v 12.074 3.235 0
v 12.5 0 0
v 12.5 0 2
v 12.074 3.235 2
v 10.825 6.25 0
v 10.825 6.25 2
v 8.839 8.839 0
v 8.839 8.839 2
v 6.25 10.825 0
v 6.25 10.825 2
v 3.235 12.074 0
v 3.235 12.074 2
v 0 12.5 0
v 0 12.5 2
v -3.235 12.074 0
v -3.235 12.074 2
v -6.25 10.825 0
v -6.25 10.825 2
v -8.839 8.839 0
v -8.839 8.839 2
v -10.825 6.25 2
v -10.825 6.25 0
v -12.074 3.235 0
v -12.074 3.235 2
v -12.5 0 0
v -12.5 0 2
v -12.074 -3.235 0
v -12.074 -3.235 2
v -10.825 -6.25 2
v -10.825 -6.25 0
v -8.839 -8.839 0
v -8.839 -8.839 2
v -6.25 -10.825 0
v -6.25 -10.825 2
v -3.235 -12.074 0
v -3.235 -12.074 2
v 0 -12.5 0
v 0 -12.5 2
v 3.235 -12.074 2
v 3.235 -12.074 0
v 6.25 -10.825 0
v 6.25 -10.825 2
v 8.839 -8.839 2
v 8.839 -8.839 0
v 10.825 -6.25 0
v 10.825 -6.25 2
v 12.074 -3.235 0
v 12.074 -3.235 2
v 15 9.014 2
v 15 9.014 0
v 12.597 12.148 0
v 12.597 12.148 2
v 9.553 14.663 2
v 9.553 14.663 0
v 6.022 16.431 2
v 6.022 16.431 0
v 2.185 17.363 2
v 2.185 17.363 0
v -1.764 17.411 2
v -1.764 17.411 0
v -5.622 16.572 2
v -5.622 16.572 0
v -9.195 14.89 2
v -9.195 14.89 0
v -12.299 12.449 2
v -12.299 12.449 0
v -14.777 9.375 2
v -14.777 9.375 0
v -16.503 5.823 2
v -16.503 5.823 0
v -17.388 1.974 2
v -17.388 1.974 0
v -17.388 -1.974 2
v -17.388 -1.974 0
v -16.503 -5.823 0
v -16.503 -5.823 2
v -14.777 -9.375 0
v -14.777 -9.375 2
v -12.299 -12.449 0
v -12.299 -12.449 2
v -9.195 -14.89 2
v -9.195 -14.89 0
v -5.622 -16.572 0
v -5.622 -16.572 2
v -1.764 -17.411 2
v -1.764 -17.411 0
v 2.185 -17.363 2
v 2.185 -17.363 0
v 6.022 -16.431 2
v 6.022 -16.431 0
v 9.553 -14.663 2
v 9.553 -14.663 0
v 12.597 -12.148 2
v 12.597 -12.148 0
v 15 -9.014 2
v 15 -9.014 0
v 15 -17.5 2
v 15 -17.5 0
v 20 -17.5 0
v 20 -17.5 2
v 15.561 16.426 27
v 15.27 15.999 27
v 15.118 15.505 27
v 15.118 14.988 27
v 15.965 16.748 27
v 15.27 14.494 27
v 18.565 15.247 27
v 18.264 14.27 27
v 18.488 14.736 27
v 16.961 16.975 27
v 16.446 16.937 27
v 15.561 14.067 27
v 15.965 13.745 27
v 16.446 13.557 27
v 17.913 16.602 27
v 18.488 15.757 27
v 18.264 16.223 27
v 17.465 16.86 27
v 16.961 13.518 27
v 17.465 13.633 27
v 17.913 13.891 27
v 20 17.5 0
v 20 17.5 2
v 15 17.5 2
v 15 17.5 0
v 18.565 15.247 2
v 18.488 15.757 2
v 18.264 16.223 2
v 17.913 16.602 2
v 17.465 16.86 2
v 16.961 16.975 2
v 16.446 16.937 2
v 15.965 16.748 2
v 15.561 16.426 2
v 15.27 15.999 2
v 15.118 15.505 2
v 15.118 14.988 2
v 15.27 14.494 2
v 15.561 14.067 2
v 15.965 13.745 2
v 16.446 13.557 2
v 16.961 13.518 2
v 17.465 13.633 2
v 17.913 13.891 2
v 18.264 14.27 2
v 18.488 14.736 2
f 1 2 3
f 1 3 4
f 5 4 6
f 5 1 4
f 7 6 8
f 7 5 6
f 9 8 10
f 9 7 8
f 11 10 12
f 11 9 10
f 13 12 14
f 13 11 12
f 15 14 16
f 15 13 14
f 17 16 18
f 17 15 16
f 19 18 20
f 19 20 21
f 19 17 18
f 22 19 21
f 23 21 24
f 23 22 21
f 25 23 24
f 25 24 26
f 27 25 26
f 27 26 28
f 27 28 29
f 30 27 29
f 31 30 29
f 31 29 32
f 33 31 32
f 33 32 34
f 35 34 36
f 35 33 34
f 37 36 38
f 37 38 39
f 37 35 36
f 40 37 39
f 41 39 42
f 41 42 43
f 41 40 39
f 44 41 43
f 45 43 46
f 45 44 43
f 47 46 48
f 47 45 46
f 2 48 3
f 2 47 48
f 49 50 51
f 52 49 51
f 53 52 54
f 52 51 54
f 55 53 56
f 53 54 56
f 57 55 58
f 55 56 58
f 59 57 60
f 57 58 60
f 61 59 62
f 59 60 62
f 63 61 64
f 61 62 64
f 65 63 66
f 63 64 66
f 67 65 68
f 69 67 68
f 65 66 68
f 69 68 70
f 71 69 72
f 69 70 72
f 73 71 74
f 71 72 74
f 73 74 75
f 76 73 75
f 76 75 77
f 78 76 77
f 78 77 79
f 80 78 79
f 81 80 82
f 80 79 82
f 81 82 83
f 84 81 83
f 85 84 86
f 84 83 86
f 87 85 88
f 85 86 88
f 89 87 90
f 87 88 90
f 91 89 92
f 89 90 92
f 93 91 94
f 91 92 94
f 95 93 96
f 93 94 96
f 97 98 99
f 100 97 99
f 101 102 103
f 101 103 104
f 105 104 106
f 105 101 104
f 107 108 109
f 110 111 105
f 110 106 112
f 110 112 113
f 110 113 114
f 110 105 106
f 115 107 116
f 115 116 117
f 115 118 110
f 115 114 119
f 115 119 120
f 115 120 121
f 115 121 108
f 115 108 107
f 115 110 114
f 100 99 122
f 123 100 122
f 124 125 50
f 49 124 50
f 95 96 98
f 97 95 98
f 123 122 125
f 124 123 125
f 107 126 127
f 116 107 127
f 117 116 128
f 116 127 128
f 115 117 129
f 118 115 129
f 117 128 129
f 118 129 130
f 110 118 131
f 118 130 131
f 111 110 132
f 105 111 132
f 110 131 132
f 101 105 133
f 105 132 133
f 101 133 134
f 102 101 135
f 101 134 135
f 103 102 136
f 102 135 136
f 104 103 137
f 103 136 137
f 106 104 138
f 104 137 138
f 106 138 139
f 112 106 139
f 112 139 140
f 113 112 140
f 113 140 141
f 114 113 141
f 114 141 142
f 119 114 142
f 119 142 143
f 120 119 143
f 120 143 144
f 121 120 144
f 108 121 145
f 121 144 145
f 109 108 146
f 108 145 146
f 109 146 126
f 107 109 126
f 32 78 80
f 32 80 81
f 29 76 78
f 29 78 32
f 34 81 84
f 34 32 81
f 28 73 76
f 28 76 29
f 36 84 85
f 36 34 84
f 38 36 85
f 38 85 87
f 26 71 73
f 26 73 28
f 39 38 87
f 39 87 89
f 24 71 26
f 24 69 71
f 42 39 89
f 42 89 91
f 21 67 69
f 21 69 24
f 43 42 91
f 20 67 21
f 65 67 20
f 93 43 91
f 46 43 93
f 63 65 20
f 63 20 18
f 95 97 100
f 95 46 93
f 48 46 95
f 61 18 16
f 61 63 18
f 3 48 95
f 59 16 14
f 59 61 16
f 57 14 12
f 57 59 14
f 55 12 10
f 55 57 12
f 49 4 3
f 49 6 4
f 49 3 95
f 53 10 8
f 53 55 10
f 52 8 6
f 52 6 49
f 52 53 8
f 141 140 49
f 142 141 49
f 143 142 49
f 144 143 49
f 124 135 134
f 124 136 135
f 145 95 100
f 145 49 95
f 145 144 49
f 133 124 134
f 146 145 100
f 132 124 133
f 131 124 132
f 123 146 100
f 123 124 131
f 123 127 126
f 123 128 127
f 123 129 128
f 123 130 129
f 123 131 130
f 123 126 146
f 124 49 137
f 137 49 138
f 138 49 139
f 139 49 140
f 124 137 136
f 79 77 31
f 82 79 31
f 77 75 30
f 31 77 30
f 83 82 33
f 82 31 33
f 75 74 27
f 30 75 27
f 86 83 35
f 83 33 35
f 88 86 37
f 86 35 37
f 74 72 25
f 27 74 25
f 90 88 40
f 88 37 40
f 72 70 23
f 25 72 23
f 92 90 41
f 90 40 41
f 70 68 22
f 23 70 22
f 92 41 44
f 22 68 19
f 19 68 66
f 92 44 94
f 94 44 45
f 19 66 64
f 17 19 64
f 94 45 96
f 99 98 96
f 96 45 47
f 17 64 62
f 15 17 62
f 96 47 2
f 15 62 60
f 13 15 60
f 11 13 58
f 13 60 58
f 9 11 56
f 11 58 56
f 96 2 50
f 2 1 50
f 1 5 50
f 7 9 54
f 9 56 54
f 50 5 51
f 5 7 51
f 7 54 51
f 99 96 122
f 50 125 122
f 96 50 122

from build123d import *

# Parameters (mm, degrees)
F0_R     = 12.5
F1_DEPTH = 2
F2_R     = 1.7334803781
F3_DEPTH = 25


with BuildPart() as f1:
    # F0 (on Top) → F1 (new body)
    with BuildSketch(Plane.XY):
        with BuildLine():
            Line((14.9999987334, -9.0138802964), (14.9999987334, 9.0138802964))
            ThreePointArc((14.9999987334, 9.0138802964), (-17.5, 0), (14.9999987334, -9.0138802964))
        make_face()
        Circle(F0_R, mode=Mode.SUBTRACT)
        with BuildLine():
            ThreePointArc((14.9999987334, -9.0138802964), (16.8634216254, -4.6770729183), (17.5, 0))
            ThreePointArc((17.5, 0), (16.8634216254, 4.6770729183), (14.9999987334, 9.0138802964))
            Line((14.9999987334, 9.0138802964), (14.9999987334, -9.0138802964))
        make_face()
        with BuildLine():
            ThreePointArc((14.9999987334, 9.0138802964), (16.8634216254, 4.6770729183), (17.5, 0))
            ThreePointArc((17.5, 0), (16.8634216254, -4.6770729183), (14.9999987334, -9.0138802964))
            Line((14.9999987334, -9.0138802964), (14.9999987334, -17.5000000745))
            Line((14.9999987334, -17.5000000745), (19.9999987334, -17.5000000745))
            Line((19.9999987334, -17.5000000745), (19.9999987334, 17.4999999255))
            Line((19.9999987334, 17.4999999255), (14.9999987334, 17.4999999255))
            Line((14.9999987334, 17.4999999255), (14.9999987334, 9.0138802964))
        make_face()
    extrude(amount=F1_DEPTH)

    # F2 (on face) → F3 (join)
    with BuildSketch(Plane.XY.offset(2)):
        with Locations((16.8318804353, 15.2465272695)):
            Circle(F2_R)
    extrude(amount=F3_DEPTH)


solid = f1.part
